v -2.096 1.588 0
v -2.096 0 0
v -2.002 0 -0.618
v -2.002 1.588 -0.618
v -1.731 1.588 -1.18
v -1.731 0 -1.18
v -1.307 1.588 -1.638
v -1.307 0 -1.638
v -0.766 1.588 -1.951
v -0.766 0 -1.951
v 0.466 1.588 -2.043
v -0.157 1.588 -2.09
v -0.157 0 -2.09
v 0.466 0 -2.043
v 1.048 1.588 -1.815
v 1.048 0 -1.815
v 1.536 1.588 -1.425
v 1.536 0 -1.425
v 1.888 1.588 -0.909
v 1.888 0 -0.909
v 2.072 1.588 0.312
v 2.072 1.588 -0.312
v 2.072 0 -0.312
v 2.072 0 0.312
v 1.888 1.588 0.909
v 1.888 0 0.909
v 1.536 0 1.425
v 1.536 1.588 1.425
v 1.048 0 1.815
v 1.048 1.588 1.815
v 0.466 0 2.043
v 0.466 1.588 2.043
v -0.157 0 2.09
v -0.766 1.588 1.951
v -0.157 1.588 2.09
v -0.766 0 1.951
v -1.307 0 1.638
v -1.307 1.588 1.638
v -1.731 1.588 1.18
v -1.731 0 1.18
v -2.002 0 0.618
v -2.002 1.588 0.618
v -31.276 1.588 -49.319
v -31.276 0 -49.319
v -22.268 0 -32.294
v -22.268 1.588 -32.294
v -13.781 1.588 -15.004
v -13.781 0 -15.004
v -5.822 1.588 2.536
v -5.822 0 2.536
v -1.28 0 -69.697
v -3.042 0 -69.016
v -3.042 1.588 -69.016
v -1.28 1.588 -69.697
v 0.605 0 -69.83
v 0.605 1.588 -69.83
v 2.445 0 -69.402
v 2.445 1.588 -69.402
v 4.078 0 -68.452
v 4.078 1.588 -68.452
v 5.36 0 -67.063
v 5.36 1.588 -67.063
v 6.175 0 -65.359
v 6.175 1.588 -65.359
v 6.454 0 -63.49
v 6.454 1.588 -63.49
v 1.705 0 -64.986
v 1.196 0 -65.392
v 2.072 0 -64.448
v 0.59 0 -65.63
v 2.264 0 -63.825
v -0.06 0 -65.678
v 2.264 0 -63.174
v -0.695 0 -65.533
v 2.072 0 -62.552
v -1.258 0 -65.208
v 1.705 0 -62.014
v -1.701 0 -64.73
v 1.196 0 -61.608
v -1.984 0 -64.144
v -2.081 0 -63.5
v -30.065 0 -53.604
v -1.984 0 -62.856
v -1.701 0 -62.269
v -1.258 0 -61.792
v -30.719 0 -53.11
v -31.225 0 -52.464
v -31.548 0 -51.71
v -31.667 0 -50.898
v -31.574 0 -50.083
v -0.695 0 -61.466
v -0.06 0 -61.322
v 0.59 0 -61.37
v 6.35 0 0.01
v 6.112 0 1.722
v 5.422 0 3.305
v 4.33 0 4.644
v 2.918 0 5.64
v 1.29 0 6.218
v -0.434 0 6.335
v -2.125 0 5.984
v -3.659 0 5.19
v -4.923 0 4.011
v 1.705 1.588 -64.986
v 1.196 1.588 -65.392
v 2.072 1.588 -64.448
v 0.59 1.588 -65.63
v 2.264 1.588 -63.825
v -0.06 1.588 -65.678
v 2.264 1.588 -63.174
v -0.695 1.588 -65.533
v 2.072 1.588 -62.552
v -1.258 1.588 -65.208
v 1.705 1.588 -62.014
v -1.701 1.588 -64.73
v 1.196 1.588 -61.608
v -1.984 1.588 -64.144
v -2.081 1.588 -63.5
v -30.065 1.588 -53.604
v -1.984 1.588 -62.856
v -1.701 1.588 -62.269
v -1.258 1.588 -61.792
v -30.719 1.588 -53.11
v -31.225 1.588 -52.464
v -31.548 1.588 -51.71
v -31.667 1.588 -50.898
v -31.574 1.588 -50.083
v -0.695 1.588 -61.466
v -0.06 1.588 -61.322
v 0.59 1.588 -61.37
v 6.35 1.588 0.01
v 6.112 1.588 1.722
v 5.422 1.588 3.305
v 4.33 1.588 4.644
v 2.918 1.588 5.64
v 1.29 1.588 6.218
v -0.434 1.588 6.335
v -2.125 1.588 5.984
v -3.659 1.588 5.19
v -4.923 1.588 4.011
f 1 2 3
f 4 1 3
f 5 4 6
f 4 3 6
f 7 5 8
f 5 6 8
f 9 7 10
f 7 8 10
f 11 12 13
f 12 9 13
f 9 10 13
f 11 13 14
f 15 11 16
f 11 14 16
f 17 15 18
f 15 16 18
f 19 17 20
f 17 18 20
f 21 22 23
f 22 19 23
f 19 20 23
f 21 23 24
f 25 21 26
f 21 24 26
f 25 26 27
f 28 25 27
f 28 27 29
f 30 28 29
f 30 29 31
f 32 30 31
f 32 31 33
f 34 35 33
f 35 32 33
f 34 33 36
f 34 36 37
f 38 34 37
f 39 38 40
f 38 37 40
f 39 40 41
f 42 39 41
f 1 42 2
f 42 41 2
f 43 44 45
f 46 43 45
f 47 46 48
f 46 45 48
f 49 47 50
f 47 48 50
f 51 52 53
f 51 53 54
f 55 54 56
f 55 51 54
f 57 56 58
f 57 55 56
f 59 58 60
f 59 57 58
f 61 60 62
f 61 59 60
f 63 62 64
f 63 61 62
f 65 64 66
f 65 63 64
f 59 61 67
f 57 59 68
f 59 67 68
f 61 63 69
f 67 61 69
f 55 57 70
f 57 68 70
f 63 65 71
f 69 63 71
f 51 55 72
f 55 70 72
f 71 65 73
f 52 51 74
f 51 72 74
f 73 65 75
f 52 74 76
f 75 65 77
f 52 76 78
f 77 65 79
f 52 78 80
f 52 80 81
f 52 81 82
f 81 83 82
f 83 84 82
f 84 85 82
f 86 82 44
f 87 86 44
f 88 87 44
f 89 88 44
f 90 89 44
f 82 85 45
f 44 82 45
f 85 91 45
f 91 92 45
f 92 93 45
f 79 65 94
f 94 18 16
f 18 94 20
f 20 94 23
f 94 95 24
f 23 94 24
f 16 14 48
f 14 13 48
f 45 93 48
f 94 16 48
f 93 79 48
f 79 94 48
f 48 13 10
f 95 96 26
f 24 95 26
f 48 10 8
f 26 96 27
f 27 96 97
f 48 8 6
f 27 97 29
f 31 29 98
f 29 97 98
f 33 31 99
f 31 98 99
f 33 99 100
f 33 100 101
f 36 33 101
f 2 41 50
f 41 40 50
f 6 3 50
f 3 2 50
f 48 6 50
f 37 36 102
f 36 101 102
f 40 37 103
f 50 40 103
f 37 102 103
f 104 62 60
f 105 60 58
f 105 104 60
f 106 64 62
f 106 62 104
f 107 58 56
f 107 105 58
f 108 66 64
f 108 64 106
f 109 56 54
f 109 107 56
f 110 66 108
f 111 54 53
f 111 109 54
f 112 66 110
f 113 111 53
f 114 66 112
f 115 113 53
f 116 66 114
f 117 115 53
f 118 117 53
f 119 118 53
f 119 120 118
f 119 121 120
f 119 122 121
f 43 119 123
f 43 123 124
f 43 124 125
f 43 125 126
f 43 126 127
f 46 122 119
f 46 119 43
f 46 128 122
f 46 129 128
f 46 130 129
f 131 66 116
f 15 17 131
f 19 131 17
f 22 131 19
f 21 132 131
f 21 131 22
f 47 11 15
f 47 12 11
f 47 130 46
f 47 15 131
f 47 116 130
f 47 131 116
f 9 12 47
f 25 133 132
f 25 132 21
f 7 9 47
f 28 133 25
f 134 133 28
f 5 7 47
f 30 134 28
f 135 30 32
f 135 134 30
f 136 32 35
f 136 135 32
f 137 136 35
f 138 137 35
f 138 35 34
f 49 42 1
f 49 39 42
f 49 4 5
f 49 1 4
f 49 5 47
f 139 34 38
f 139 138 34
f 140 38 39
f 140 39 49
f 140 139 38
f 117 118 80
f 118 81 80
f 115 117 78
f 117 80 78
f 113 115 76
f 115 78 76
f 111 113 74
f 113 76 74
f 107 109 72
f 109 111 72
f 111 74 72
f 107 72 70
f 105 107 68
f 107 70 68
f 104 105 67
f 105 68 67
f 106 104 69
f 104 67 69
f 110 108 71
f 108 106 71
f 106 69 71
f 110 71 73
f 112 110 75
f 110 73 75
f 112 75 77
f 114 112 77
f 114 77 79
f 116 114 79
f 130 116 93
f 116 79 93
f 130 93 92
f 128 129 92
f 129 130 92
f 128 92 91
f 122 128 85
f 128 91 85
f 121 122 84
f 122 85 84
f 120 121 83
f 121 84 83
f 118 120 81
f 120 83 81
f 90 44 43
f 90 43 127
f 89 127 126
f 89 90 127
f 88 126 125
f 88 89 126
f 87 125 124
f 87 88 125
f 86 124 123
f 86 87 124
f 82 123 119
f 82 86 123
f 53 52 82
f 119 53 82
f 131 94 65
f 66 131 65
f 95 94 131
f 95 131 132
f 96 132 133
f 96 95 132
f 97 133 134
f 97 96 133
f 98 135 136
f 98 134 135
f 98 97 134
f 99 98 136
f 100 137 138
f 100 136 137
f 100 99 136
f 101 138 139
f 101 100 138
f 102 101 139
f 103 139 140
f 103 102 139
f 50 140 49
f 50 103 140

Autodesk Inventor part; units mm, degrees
ref_plane "YZ Plane" through (0, 0, 0) normal (1, 0, 0) x (0, 1, 0)
ref_plane "XZ Plane" through (0, 0, 0) normal (0, 1, 0) x (-1, 0, 0)
ref_plane "XY Plane" through (0, 0, 0) normal (0, 0, 1) x (1, 0, 0)
sketch "main" plane through (0, 0, 0) normal (0, 0, 1) x (1, 0, 0)
  circle A0 centre (31.4944, -42.9627) radius 2.1844
  arc A1 (31.4944, -49.3127) -> (37.0053, -39.8078) centre (31.4944, -42.9627) ccw
  arc A2 (-34.551, -37.1452) -> (-32.0056, -49.3127) centre (-32.0056, -42.9627) ccw
  arc A3 (-34.551, -37.1452) -> (17.2626, -11.6066) centre (-289.0911, 544.606) ccw
  line L0 (37.0053, -39.8078) -> (21.5498, -12.8103)
  line L1 (-32.0056, -49.3127) -> (31.4944, -49.3127)
  arc A4 (21.5498, -12.8103) -> (17.2626, -11.6066) centre (18.7944, -14.3877) ccw
  circle A5 centre (-32.0056, -42.9627) radius 2.0955
  point P0 (5.1717, -33.3366)
  point P1 (19.9944, -10.0932)
  dimension "d0" = 1270
  dimension "d1" = 12.7
  dimension "d2" = 12.7
  dimension "d3" = 3.175
  dimension "d4" = 4.191
  dimension "d7" = 34.925
  dimension "d8" = 12.7
sketch "Sketch1" plane through (0, 0, 0) normal (0, 1, 0) x (-1, 0, 0)
  circle A0 centre (-0.1035, -63.4999) radius 2.1844
  arc A1 (-6.4535, -63.4896) -> (3.0424, -69.0159) centre (-0.1035, -63.4999) ccw
  arc A2 (5.8217, 2.5359) -> (-6.35, 0.0103) centre (0, 0) ccw
  arc A3 (5.8217, 2.5359) -> (31.2757, -49.3193) centre (587.9868, 256.1277) ccw
  line L0 (3.0424, -69.0159) -> (30.0651, -53.6045)
  line L1 (-6.35, 0.0103) -> (-6.4535, -63.4896)
  arc A4 (30.0651, -53.6045) -> (31.2757, -49.3193) centre (28.4922, -50.8465) ccw
  circle A5 centre (0, 0) radius 2.0955
  point P0 (0, 0)
extrude "Extrusion1" add sketch "Sketch1" along normal blind 1.5875
properties part number "Magazine Gusset" material "Acetal Resin, White"
